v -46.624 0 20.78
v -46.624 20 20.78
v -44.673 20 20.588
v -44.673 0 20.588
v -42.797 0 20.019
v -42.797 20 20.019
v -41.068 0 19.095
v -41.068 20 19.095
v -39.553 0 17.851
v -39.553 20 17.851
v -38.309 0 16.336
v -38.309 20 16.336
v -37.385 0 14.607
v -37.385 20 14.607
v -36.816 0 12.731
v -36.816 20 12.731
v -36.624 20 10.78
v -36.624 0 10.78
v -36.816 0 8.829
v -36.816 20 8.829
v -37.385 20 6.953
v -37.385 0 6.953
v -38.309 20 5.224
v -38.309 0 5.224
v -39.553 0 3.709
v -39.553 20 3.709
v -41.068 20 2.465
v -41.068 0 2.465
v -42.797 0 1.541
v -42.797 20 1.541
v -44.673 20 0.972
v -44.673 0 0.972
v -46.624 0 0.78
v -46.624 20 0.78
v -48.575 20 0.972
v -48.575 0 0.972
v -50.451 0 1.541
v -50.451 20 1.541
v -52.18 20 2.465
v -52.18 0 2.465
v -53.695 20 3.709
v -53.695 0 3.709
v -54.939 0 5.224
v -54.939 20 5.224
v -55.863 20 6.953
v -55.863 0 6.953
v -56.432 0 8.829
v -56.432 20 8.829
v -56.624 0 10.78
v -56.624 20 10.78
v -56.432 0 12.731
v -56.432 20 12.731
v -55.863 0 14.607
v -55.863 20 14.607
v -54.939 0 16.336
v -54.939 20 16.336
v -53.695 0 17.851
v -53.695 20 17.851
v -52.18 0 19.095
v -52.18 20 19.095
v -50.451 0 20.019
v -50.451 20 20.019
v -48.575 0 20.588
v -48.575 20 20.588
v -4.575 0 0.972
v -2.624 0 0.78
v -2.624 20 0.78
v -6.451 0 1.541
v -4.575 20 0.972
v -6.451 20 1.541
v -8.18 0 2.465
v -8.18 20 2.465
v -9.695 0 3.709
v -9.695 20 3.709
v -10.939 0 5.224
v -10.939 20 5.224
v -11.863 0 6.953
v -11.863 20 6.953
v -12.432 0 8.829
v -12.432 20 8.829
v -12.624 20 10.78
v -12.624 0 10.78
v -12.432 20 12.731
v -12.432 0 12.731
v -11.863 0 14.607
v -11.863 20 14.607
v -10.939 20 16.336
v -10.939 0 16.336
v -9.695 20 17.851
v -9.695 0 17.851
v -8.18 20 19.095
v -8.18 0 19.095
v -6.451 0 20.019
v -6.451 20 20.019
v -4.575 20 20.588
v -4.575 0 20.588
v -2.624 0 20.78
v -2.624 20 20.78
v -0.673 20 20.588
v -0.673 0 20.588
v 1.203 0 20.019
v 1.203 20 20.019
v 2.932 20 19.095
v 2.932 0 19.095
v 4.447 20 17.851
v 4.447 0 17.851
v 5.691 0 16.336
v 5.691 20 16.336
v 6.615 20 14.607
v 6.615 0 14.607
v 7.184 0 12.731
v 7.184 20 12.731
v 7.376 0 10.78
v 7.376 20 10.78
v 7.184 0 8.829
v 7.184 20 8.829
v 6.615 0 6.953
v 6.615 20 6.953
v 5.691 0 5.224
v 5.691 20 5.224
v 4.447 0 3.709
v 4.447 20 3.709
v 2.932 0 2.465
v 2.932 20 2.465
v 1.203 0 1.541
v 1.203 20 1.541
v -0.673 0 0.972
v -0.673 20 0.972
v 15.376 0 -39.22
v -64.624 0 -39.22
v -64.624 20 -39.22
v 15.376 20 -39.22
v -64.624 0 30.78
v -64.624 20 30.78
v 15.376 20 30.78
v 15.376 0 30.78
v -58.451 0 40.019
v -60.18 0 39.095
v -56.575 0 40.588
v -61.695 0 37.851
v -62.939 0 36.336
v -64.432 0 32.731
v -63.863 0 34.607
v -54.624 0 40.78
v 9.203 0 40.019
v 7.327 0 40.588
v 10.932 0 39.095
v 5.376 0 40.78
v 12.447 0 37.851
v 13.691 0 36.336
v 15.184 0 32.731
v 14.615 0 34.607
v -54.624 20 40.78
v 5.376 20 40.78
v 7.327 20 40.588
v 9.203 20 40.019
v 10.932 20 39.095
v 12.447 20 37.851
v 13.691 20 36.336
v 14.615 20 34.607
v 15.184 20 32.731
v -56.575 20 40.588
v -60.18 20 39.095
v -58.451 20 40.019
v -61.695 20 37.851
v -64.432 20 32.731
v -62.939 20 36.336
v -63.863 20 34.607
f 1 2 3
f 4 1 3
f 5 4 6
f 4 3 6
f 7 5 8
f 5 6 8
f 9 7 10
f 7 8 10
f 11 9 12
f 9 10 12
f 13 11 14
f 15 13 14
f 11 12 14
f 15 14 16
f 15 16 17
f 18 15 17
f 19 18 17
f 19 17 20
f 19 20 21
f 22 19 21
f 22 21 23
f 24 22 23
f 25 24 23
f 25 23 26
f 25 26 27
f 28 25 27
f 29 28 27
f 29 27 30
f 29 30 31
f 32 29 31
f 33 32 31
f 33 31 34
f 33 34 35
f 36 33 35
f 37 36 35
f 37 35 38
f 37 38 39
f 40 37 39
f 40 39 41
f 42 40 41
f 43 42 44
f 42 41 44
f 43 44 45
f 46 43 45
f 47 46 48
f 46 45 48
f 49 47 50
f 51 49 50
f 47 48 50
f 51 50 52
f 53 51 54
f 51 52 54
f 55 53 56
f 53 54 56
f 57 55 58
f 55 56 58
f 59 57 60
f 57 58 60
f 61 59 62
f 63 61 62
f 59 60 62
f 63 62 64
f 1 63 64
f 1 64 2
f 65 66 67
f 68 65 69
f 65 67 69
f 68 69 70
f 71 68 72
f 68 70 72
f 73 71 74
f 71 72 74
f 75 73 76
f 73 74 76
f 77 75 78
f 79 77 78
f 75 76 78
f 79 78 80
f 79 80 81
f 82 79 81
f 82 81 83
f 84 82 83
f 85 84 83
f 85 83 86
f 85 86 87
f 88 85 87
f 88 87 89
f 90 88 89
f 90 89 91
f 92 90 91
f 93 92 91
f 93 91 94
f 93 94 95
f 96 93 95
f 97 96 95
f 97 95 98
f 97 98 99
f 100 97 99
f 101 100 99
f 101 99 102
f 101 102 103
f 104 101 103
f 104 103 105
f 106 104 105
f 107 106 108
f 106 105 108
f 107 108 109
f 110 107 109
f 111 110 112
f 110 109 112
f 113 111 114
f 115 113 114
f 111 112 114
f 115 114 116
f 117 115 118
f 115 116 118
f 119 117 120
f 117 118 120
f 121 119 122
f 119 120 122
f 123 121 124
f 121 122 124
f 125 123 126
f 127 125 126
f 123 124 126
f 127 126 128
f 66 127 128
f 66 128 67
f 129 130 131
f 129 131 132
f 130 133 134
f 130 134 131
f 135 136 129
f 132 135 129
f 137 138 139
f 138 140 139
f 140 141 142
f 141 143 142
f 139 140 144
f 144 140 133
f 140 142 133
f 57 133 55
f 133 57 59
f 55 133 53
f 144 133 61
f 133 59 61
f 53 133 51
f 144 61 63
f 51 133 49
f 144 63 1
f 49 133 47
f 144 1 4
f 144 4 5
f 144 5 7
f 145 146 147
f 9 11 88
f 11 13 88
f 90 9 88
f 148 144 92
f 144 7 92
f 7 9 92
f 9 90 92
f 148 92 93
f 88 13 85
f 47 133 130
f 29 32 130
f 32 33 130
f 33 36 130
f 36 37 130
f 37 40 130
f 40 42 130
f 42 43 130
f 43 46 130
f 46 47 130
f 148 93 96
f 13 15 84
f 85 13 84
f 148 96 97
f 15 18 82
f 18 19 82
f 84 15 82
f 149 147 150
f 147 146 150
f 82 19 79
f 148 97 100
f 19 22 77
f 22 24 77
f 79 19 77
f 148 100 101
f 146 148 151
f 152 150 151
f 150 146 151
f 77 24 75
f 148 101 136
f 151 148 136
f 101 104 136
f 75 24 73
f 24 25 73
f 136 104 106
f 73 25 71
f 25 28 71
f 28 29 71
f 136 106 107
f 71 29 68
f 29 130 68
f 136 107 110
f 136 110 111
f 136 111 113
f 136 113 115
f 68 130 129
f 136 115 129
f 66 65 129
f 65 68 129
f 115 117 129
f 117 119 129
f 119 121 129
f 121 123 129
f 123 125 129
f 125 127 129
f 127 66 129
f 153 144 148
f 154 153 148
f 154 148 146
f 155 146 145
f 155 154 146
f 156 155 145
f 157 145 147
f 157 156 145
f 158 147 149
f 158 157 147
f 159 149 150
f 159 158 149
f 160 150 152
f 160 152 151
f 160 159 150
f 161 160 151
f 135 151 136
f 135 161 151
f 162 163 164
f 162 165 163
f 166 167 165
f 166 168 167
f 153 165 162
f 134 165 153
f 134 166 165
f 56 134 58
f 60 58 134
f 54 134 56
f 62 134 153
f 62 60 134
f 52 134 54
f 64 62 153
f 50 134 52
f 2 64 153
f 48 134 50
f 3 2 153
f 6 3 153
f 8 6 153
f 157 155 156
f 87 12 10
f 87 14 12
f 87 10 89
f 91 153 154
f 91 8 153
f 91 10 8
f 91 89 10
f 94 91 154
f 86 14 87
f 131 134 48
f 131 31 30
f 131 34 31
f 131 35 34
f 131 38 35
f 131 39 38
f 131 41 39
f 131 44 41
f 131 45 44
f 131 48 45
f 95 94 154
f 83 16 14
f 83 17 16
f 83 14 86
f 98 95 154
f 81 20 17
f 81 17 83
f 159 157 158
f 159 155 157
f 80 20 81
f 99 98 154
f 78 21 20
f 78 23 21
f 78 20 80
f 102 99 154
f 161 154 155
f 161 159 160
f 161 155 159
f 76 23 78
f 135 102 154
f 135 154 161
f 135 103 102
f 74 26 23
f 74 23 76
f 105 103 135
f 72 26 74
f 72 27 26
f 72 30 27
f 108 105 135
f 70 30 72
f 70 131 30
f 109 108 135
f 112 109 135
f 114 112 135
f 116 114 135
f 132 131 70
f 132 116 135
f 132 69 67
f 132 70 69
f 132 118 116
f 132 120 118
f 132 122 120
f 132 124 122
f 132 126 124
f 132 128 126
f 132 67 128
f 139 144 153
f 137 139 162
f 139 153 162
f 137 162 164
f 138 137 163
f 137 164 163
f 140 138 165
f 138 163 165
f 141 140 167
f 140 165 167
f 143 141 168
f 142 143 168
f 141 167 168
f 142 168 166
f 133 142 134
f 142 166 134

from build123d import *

# Parameters (mm, degrees)
CROQUIS2_W              = 80
CROQUIS2_H              = 80
SALIENTE_EXTRUIR1_DEPTH = 20
REDONDEO1_R             = 10
REDONDEO2_R             = 10
CROQUIS3_R              = 10
CORTAR_EXTRUIR1_DEPTH   = 79.988983231


with BuildPart() as part:
    # Croquis2 → Saliente-Extruir1 (new body)
    with BuildSketch(Plane(origin=(0, 0, 0), x_dir=(1, 0, 0), z_dir=(0, 1, 0))):
        with Locations((-24.623955432, -0.77994429)):
            Rectangle(CROQUIS2_W, CROQUIS2_H)
    extrude(amount=SALIENTE_EXTRUIR1_DEPTH)

    # Redondeo1
    redondeo1_edges = [part.edges().sort_by_distance(p)[0] for p in [
        (15.376044568, 10, 40.77994429),
    ]]
    fillet(redondeo1_edges, radius=REDONDEO1_R)

    # Redondeo2
    redondeo2_edges = [part.edges().sort_by_distance(p)[0] for p in [
        (-64.623955432, 10, 40.77994429),
    ]]
    fillet(redondeo2_edges, radius=REDONDEO2_R)

    # Croquis3 → Cortar-Extruir1 (cut, through all)
    with BuildSketch(Plane(origin=(0, 20, 0), x_dir=(1, 0, 0), z_dir=(0, 1, 0))):
        with Locations(Location((-46.623955432, -10.77994429, 0), (0, 0, 270))):
            Circle(CROQUIS3_R)
        with Locations(Location((-2.623955432, -10.77994429, 0), (0, 0, 90))):
            Circle(CROQUIS3_R)
    extrude(amount=-CORTAR_EXTRUIR1_DEPTH, mode=Mode.SUBTRACT)


solid = part.part
